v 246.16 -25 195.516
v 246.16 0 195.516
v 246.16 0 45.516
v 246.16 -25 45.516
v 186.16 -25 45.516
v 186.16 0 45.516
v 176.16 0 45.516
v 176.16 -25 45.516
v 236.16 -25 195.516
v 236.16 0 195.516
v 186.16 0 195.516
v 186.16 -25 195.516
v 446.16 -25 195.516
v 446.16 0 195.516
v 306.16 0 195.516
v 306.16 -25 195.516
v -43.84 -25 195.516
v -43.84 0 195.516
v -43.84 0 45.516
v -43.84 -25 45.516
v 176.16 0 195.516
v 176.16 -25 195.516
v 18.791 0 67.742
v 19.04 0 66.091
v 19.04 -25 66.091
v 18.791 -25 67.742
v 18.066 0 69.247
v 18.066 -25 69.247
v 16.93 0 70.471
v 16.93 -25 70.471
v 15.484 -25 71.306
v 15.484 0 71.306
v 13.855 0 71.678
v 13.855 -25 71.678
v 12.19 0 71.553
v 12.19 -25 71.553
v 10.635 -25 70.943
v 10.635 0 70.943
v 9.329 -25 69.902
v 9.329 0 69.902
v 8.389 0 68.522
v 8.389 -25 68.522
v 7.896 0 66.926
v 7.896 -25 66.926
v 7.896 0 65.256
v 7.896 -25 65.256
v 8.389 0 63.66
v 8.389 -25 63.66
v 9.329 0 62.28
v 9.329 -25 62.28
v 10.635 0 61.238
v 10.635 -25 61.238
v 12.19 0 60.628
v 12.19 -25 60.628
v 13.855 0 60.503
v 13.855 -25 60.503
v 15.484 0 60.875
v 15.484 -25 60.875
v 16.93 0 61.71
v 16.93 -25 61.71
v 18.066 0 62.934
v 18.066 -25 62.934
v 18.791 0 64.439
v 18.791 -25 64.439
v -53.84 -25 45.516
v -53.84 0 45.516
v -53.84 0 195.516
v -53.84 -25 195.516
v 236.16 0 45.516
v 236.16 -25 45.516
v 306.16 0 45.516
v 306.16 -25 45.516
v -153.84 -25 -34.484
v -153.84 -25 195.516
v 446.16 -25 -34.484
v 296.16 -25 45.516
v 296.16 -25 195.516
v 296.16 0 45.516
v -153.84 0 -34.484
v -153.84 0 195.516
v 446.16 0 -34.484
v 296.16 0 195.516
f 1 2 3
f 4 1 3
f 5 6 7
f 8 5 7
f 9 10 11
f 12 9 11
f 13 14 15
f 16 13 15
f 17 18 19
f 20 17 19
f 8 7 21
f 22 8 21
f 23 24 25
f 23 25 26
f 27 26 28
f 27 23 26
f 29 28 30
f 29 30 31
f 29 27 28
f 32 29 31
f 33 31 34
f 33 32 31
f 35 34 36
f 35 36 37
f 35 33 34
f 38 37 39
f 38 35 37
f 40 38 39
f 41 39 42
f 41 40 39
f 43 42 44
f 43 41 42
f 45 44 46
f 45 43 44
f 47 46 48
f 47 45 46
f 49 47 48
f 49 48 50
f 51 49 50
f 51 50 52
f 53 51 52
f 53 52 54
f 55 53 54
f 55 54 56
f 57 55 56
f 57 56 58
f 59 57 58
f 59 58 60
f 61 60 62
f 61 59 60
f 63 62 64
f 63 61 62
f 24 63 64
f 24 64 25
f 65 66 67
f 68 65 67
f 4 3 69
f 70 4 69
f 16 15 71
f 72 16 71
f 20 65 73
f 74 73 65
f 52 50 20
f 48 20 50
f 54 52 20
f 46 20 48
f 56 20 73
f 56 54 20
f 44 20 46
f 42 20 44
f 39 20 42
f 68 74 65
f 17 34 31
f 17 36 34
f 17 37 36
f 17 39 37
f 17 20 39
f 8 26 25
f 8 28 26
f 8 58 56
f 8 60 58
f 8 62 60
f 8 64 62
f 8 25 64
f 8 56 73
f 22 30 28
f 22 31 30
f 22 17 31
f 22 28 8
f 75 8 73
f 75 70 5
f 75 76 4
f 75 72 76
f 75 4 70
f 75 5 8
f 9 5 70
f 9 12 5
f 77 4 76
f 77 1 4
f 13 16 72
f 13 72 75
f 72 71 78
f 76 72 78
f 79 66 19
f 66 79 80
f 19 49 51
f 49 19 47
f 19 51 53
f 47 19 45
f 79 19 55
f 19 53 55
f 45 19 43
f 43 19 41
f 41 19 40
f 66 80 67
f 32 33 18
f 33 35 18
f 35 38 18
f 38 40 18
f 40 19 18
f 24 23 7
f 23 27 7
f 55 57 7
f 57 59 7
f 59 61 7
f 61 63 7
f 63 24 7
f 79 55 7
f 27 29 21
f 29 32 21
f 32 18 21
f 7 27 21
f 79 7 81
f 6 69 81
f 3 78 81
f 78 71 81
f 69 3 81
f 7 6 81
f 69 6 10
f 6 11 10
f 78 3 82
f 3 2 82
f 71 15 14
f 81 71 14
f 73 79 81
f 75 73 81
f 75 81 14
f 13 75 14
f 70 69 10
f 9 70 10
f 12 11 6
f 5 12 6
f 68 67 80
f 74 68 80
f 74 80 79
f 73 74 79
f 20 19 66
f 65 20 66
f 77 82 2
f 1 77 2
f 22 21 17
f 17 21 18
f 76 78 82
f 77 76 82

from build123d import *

# Parameters (mm, degrees)
F0_R     = 5.602905
F1_DEPTH = 25


with BuildPart() as f1:
    # F0 (on Front) → F1 (new body)
    with BuildSketch(Plane.XZ):
        Polygon((-53.839558, 195.515509), (-153.839558, 195.515509), (-153.839558, -34.484491), (446.160442, -34.484491), (446.160442, 195.515509), (306.160442, 195.515509), (306.160442, 45.515509), (296.160442, 45.515509), (296.160442, 195.515509), (246.160442, 195.515509), (246.160442, 45.515509), (236.160442, 45.515509), (236.160442, 195.515509), (186.160442, 195.515509), (186.160442, 45.515509), (176.160442, 45.515509), (176.160442, 195.515509), (-43.839558, 195.515509), (-43.839558, 45.515509), (-53.839558, 45.515509), align=None)
        with Locations((13.436623, 66.090696)):
            Circle(F0_R, mode=Mode.SUBTRACT)
    extrude(amount=F1_DEPTH)


solid = f1.part
